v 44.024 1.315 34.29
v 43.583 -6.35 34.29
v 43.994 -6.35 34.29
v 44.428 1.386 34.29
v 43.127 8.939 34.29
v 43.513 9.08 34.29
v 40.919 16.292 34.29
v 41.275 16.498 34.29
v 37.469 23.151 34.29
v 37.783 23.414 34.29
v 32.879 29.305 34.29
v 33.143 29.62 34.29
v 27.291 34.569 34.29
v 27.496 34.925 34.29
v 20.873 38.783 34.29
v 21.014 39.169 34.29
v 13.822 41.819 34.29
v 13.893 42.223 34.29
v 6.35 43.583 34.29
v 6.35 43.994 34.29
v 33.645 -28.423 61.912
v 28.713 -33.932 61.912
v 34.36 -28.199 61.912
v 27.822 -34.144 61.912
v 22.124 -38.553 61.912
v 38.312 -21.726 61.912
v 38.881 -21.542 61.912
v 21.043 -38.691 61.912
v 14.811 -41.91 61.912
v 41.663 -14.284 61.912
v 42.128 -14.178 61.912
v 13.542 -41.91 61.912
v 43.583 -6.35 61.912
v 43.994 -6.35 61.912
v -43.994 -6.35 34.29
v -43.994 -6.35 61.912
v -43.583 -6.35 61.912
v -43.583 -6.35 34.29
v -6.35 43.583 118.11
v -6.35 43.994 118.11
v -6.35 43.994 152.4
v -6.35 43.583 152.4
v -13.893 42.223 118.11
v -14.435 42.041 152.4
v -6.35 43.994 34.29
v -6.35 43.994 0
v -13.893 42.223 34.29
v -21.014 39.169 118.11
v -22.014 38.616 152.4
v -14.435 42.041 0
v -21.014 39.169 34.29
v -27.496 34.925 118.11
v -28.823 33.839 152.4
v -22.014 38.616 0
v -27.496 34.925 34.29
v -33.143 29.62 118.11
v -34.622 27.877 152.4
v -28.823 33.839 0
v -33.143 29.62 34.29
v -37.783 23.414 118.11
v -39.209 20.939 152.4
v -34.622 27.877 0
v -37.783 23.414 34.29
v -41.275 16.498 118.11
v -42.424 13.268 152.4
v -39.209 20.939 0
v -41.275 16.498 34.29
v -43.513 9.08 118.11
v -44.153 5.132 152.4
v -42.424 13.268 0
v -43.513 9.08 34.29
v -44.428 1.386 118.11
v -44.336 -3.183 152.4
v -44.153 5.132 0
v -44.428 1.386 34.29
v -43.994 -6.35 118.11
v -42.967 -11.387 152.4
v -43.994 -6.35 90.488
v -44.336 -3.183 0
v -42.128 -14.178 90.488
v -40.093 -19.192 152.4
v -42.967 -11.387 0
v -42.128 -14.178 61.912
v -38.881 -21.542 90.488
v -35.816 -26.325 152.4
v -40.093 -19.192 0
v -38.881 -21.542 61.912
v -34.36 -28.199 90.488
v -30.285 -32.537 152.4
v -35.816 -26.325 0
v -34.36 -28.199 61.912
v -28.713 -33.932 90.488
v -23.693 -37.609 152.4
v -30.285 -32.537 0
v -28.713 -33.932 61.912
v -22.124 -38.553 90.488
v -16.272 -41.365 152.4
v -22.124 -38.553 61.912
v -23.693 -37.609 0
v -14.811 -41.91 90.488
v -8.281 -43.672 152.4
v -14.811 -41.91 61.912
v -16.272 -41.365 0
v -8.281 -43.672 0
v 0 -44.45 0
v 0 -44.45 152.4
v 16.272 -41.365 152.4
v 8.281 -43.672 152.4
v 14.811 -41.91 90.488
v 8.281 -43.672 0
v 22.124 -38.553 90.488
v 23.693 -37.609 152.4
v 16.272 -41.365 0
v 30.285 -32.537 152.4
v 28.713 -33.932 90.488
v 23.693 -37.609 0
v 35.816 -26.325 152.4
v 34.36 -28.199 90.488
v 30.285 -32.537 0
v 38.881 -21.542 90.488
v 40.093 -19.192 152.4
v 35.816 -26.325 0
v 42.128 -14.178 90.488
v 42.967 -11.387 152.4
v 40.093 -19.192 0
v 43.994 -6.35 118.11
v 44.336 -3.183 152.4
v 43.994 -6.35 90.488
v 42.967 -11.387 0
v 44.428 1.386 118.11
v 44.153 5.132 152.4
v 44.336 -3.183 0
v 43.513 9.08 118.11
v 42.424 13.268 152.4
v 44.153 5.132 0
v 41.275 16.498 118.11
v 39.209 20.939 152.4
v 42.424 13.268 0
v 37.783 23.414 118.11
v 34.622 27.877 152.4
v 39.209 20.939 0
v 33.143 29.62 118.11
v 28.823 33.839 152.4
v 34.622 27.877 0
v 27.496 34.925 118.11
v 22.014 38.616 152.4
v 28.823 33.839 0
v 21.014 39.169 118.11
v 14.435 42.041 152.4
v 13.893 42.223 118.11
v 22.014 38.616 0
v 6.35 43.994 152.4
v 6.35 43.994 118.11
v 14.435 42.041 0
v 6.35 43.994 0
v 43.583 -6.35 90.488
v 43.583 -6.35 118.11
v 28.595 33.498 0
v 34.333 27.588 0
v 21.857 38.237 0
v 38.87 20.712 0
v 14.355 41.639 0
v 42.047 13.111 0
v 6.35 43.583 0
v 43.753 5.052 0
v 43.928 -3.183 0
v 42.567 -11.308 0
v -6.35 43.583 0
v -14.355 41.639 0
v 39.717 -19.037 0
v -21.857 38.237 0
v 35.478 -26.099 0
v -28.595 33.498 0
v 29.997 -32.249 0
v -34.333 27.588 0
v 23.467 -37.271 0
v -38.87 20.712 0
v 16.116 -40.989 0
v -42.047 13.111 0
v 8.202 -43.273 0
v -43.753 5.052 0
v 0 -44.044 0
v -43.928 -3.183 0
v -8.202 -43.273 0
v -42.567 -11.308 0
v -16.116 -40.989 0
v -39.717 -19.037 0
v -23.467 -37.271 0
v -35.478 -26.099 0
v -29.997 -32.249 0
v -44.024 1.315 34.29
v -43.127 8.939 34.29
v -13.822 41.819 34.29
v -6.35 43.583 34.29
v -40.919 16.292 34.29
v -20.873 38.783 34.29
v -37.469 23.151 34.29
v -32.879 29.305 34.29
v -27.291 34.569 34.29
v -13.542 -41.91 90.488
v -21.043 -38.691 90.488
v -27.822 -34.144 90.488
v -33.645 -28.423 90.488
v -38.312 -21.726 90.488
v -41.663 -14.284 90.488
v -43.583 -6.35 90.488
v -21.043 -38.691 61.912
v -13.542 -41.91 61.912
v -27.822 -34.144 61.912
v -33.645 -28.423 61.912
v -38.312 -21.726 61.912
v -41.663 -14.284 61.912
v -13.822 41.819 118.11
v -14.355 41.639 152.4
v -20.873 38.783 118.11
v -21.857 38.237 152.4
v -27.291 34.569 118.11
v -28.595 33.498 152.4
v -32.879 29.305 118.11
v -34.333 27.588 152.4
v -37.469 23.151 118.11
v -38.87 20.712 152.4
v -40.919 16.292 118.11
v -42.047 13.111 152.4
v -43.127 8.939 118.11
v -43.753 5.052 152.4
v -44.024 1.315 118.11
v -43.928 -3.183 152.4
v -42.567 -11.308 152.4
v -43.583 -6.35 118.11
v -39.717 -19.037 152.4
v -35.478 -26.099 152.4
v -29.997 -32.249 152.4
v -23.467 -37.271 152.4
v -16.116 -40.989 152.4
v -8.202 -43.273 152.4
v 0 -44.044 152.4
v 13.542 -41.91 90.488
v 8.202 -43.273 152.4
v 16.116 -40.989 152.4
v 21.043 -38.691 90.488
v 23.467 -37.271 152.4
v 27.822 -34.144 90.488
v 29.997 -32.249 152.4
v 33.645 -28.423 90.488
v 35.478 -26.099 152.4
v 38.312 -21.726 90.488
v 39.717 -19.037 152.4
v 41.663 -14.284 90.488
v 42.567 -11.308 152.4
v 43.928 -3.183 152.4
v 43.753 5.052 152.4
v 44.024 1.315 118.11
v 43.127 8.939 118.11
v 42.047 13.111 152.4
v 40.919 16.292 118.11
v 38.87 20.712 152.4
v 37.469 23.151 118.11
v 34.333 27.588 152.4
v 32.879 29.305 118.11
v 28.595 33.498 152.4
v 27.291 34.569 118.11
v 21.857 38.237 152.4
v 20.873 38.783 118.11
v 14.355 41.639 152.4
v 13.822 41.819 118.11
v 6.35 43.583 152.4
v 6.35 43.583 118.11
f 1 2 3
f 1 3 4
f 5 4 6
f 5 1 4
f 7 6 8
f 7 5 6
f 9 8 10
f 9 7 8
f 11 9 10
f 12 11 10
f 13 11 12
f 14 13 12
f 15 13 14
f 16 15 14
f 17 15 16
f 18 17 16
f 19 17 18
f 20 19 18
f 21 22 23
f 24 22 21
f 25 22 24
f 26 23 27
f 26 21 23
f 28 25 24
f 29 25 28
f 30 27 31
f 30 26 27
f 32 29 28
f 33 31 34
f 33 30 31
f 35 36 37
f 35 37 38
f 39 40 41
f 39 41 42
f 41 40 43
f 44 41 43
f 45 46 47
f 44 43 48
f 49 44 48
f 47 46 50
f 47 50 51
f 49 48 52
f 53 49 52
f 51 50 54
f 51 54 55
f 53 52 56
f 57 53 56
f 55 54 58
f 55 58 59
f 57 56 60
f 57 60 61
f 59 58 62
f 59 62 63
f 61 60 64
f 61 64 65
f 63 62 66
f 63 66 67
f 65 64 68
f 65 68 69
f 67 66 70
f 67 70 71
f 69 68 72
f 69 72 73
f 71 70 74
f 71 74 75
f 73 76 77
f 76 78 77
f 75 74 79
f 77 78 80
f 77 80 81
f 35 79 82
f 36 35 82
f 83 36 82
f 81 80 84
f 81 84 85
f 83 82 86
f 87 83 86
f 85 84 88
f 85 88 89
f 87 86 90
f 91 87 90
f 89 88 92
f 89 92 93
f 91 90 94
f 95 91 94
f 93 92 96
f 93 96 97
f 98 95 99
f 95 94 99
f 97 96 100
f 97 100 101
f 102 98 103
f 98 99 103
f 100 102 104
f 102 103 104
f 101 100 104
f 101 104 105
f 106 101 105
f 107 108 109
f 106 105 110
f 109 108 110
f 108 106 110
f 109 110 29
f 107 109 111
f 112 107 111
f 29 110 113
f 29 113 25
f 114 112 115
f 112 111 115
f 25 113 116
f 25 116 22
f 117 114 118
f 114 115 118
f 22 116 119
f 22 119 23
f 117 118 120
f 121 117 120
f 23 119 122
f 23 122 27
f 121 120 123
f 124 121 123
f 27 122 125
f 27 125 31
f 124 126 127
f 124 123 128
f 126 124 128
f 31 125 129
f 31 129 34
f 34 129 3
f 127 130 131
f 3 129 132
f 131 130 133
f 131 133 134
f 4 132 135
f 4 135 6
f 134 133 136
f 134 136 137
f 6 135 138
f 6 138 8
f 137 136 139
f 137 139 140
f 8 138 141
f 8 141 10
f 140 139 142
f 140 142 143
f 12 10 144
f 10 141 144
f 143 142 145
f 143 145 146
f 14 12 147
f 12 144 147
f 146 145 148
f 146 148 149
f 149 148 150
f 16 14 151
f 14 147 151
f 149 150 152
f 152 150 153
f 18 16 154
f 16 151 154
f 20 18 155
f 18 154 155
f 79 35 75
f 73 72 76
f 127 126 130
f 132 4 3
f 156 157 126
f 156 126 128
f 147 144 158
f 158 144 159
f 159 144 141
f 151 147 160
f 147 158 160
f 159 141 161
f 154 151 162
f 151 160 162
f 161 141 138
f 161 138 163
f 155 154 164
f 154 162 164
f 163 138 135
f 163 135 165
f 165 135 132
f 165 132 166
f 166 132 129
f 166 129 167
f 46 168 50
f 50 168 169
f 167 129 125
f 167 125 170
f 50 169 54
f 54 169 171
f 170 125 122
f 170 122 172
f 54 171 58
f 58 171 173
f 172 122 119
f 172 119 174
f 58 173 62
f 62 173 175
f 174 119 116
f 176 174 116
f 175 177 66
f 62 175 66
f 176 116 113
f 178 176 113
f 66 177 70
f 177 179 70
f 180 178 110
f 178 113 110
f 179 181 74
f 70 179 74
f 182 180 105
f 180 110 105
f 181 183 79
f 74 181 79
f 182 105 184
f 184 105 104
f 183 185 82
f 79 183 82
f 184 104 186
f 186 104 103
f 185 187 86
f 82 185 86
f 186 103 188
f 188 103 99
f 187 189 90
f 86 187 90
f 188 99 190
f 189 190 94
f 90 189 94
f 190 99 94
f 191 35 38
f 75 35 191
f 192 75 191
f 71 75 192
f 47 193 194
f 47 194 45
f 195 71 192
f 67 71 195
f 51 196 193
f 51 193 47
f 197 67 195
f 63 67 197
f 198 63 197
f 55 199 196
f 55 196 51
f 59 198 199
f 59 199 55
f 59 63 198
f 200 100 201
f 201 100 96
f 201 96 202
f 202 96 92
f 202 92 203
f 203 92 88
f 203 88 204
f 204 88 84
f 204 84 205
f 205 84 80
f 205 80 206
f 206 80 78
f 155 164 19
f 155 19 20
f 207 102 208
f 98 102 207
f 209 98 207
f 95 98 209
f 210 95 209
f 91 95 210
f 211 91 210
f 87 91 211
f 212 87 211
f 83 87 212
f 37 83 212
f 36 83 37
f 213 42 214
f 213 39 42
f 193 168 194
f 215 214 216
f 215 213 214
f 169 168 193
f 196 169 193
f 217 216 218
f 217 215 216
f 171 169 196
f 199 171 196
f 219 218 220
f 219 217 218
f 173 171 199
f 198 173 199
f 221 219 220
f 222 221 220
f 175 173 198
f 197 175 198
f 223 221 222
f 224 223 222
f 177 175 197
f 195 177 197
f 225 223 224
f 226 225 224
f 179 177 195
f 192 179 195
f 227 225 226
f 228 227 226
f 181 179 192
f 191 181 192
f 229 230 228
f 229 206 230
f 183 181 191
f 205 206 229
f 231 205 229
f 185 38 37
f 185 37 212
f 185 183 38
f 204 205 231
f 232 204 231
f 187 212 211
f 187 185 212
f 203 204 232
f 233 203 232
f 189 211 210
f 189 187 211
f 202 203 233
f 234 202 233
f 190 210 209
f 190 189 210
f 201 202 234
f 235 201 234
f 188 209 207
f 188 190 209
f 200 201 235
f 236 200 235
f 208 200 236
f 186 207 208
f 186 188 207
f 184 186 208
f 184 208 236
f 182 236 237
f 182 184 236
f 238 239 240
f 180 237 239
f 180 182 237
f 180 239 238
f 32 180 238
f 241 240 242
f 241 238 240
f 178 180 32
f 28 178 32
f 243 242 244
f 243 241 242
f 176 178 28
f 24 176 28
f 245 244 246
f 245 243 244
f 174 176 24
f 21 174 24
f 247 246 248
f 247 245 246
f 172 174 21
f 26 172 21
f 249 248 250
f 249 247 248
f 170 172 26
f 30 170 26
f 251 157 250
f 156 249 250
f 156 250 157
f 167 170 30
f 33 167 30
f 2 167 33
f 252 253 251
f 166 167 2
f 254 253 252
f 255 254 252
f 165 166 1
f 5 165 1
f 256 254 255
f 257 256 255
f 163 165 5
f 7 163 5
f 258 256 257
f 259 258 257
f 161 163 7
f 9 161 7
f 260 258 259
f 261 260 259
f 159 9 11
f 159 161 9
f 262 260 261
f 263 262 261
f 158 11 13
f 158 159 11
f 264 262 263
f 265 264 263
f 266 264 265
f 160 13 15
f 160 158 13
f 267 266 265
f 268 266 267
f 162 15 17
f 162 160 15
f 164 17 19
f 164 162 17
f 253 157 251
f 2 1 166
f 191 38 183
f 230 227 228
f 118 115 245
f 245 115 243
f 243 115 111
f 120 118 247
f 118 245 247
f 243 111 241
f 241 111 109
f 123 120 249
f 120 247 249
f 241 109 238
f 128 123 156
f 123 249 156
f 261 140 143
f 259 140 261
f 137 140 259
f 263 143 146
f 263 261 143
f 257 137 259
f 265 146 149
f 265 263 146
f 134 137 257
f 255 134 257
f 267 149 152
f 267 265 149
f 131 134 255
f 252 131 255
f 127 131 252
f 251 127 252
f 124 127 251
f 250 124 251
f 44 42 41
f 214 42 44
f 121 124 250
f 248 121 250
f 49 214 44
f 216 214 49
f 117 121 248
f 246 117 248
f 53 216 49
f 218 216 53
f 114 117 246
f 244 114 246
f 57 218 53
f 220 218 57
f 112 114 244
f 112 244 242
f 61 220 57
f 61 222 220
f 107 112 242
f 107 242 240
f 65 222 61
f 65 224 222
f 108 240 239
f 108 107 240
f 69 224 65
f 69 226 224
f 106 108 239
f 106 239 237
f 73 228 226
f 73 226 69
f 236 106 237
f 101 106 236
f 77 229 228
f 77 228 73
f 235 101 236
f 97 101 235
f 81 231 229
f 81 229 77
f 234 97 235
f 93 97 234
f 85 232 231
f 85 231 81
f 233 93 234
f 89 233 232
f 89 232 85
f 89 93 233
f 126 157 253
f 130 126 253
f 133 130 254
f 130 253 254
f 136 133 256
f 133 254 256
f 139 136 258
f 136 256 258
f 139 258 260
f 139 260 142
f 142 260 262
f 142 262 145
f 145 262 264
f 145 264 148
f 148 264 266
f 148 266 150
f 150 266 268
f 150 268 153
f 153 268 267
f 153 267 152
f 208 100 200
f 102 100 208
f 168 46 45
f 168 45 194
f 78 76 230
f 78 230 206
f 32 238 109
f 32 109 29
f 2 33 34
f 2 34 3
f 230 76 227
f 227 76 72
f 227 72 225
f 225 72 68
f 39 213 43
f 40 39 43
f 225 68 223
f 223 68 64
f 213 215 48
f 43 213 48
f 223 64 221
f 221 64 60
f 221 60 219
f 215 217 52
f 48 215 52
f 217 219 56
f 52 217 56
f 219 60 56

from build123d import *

# Parameters (mm, degrees)
SKETCH1_R               = 44.45
SKETCH1_R_2             = 44.0436
EXTRUDE1_DEPTH          = 152.4
CUT_EXTRUDE1_START      = -152.4
CUT_EXTRUDE1_DEPTH      = 152.4
CUT_EXTRUDE2_DEPTH      = 152.4
CUT_EXTRUDE2_DEPTH_BACK = 152.4
SKETCH3_W               = 83.82
SKETCH3_H               = 76.2
CUT_EXTRUDE3_DEPTH      = 152.4
CUT_EXTRUDE3_DEPTH_BACK = 152.4
SKETCH4_W               = 28.575
SKETCH4_H               = 35.56


with BuildPart() as part:
    # Sketch1 → Extrude1 (new body)
    with BuildSketch(Plane.XY):
        with Locations(Location((0, 0, 0), (0, 0, 180))):
            Circle(SKETCH1_R)
        with Locations(Location((0, 0, 0), (0, 0, 180))):
            Circle(SKETCH1_R_2, mode=Mode.SUBTRACT)
    extrude(amount=EXTRUDE1_DEPTH)

    # Sketch2 → Cut-Extrude1 (cut)
    with BuildSketch(Plane.XY.offset(152.4).offset(CUT_EXTRUDE1_START)):
        with BuildLine():
            Line((-6.35, 43.994090512), (-6.35, 43.583439526))
            ThreePointArc((-6.35, 43.583439526), (0, 44.0436), (6.35, 43.583439526))
            Line((6.35, 43.583439526), (6.35, 43.994090512))
            ThreePointArc((6.35, 43.994090512), (0, 44.45), (-6.35, 43.994090512))
        make_face()
    extrude(amount=CUT_EXTRUDE1_DEPTH, mode=Mode.SUBTRACT)

    # Sketch3 → Cut-Extrude2 (cut, two sides: drawn at the far end of the back side and taken through both)
    with BuildSketch(Plane(origin=(0, 0, 0), x_dir=(0, 0, -1), z_dir=(1, 0, 0)).offset(-CUT_EXTRUDE2_DEPTH_BACK)):
        with Locations((-76.2, 31.75)):
            Rectangle(SKETCH3_W, SKETCH3_H)
    extrude(amount=CUT_EXTRUDE2_DEPTH + CUT_EXTRUDE2_DEPTH_BACK, mode=Mode.SUBTRACT)

    # Sketch4 → Cut-Extrude3 (cut, two sides: drawn at the far end of the back side and taken through both)
    with BuildSketch(Plane(origin=(0, 0, 0), x_dir=(0, 0, -1), z_dir=(1, 0, 0)).offset(-CUT_EXTRUDE3_DEPTH_BACK)):
        with Locations((-76.2, -24.13)):
            Rectangle(SKETCH4_W, SKETCH4_H)
    extrude(amount=CUT_EXTRUDE3_DEPTH + CUT_EXTRUDE3_DEPTH_BACK, mode=Mode.SUBTRACT)


solid = part.part
